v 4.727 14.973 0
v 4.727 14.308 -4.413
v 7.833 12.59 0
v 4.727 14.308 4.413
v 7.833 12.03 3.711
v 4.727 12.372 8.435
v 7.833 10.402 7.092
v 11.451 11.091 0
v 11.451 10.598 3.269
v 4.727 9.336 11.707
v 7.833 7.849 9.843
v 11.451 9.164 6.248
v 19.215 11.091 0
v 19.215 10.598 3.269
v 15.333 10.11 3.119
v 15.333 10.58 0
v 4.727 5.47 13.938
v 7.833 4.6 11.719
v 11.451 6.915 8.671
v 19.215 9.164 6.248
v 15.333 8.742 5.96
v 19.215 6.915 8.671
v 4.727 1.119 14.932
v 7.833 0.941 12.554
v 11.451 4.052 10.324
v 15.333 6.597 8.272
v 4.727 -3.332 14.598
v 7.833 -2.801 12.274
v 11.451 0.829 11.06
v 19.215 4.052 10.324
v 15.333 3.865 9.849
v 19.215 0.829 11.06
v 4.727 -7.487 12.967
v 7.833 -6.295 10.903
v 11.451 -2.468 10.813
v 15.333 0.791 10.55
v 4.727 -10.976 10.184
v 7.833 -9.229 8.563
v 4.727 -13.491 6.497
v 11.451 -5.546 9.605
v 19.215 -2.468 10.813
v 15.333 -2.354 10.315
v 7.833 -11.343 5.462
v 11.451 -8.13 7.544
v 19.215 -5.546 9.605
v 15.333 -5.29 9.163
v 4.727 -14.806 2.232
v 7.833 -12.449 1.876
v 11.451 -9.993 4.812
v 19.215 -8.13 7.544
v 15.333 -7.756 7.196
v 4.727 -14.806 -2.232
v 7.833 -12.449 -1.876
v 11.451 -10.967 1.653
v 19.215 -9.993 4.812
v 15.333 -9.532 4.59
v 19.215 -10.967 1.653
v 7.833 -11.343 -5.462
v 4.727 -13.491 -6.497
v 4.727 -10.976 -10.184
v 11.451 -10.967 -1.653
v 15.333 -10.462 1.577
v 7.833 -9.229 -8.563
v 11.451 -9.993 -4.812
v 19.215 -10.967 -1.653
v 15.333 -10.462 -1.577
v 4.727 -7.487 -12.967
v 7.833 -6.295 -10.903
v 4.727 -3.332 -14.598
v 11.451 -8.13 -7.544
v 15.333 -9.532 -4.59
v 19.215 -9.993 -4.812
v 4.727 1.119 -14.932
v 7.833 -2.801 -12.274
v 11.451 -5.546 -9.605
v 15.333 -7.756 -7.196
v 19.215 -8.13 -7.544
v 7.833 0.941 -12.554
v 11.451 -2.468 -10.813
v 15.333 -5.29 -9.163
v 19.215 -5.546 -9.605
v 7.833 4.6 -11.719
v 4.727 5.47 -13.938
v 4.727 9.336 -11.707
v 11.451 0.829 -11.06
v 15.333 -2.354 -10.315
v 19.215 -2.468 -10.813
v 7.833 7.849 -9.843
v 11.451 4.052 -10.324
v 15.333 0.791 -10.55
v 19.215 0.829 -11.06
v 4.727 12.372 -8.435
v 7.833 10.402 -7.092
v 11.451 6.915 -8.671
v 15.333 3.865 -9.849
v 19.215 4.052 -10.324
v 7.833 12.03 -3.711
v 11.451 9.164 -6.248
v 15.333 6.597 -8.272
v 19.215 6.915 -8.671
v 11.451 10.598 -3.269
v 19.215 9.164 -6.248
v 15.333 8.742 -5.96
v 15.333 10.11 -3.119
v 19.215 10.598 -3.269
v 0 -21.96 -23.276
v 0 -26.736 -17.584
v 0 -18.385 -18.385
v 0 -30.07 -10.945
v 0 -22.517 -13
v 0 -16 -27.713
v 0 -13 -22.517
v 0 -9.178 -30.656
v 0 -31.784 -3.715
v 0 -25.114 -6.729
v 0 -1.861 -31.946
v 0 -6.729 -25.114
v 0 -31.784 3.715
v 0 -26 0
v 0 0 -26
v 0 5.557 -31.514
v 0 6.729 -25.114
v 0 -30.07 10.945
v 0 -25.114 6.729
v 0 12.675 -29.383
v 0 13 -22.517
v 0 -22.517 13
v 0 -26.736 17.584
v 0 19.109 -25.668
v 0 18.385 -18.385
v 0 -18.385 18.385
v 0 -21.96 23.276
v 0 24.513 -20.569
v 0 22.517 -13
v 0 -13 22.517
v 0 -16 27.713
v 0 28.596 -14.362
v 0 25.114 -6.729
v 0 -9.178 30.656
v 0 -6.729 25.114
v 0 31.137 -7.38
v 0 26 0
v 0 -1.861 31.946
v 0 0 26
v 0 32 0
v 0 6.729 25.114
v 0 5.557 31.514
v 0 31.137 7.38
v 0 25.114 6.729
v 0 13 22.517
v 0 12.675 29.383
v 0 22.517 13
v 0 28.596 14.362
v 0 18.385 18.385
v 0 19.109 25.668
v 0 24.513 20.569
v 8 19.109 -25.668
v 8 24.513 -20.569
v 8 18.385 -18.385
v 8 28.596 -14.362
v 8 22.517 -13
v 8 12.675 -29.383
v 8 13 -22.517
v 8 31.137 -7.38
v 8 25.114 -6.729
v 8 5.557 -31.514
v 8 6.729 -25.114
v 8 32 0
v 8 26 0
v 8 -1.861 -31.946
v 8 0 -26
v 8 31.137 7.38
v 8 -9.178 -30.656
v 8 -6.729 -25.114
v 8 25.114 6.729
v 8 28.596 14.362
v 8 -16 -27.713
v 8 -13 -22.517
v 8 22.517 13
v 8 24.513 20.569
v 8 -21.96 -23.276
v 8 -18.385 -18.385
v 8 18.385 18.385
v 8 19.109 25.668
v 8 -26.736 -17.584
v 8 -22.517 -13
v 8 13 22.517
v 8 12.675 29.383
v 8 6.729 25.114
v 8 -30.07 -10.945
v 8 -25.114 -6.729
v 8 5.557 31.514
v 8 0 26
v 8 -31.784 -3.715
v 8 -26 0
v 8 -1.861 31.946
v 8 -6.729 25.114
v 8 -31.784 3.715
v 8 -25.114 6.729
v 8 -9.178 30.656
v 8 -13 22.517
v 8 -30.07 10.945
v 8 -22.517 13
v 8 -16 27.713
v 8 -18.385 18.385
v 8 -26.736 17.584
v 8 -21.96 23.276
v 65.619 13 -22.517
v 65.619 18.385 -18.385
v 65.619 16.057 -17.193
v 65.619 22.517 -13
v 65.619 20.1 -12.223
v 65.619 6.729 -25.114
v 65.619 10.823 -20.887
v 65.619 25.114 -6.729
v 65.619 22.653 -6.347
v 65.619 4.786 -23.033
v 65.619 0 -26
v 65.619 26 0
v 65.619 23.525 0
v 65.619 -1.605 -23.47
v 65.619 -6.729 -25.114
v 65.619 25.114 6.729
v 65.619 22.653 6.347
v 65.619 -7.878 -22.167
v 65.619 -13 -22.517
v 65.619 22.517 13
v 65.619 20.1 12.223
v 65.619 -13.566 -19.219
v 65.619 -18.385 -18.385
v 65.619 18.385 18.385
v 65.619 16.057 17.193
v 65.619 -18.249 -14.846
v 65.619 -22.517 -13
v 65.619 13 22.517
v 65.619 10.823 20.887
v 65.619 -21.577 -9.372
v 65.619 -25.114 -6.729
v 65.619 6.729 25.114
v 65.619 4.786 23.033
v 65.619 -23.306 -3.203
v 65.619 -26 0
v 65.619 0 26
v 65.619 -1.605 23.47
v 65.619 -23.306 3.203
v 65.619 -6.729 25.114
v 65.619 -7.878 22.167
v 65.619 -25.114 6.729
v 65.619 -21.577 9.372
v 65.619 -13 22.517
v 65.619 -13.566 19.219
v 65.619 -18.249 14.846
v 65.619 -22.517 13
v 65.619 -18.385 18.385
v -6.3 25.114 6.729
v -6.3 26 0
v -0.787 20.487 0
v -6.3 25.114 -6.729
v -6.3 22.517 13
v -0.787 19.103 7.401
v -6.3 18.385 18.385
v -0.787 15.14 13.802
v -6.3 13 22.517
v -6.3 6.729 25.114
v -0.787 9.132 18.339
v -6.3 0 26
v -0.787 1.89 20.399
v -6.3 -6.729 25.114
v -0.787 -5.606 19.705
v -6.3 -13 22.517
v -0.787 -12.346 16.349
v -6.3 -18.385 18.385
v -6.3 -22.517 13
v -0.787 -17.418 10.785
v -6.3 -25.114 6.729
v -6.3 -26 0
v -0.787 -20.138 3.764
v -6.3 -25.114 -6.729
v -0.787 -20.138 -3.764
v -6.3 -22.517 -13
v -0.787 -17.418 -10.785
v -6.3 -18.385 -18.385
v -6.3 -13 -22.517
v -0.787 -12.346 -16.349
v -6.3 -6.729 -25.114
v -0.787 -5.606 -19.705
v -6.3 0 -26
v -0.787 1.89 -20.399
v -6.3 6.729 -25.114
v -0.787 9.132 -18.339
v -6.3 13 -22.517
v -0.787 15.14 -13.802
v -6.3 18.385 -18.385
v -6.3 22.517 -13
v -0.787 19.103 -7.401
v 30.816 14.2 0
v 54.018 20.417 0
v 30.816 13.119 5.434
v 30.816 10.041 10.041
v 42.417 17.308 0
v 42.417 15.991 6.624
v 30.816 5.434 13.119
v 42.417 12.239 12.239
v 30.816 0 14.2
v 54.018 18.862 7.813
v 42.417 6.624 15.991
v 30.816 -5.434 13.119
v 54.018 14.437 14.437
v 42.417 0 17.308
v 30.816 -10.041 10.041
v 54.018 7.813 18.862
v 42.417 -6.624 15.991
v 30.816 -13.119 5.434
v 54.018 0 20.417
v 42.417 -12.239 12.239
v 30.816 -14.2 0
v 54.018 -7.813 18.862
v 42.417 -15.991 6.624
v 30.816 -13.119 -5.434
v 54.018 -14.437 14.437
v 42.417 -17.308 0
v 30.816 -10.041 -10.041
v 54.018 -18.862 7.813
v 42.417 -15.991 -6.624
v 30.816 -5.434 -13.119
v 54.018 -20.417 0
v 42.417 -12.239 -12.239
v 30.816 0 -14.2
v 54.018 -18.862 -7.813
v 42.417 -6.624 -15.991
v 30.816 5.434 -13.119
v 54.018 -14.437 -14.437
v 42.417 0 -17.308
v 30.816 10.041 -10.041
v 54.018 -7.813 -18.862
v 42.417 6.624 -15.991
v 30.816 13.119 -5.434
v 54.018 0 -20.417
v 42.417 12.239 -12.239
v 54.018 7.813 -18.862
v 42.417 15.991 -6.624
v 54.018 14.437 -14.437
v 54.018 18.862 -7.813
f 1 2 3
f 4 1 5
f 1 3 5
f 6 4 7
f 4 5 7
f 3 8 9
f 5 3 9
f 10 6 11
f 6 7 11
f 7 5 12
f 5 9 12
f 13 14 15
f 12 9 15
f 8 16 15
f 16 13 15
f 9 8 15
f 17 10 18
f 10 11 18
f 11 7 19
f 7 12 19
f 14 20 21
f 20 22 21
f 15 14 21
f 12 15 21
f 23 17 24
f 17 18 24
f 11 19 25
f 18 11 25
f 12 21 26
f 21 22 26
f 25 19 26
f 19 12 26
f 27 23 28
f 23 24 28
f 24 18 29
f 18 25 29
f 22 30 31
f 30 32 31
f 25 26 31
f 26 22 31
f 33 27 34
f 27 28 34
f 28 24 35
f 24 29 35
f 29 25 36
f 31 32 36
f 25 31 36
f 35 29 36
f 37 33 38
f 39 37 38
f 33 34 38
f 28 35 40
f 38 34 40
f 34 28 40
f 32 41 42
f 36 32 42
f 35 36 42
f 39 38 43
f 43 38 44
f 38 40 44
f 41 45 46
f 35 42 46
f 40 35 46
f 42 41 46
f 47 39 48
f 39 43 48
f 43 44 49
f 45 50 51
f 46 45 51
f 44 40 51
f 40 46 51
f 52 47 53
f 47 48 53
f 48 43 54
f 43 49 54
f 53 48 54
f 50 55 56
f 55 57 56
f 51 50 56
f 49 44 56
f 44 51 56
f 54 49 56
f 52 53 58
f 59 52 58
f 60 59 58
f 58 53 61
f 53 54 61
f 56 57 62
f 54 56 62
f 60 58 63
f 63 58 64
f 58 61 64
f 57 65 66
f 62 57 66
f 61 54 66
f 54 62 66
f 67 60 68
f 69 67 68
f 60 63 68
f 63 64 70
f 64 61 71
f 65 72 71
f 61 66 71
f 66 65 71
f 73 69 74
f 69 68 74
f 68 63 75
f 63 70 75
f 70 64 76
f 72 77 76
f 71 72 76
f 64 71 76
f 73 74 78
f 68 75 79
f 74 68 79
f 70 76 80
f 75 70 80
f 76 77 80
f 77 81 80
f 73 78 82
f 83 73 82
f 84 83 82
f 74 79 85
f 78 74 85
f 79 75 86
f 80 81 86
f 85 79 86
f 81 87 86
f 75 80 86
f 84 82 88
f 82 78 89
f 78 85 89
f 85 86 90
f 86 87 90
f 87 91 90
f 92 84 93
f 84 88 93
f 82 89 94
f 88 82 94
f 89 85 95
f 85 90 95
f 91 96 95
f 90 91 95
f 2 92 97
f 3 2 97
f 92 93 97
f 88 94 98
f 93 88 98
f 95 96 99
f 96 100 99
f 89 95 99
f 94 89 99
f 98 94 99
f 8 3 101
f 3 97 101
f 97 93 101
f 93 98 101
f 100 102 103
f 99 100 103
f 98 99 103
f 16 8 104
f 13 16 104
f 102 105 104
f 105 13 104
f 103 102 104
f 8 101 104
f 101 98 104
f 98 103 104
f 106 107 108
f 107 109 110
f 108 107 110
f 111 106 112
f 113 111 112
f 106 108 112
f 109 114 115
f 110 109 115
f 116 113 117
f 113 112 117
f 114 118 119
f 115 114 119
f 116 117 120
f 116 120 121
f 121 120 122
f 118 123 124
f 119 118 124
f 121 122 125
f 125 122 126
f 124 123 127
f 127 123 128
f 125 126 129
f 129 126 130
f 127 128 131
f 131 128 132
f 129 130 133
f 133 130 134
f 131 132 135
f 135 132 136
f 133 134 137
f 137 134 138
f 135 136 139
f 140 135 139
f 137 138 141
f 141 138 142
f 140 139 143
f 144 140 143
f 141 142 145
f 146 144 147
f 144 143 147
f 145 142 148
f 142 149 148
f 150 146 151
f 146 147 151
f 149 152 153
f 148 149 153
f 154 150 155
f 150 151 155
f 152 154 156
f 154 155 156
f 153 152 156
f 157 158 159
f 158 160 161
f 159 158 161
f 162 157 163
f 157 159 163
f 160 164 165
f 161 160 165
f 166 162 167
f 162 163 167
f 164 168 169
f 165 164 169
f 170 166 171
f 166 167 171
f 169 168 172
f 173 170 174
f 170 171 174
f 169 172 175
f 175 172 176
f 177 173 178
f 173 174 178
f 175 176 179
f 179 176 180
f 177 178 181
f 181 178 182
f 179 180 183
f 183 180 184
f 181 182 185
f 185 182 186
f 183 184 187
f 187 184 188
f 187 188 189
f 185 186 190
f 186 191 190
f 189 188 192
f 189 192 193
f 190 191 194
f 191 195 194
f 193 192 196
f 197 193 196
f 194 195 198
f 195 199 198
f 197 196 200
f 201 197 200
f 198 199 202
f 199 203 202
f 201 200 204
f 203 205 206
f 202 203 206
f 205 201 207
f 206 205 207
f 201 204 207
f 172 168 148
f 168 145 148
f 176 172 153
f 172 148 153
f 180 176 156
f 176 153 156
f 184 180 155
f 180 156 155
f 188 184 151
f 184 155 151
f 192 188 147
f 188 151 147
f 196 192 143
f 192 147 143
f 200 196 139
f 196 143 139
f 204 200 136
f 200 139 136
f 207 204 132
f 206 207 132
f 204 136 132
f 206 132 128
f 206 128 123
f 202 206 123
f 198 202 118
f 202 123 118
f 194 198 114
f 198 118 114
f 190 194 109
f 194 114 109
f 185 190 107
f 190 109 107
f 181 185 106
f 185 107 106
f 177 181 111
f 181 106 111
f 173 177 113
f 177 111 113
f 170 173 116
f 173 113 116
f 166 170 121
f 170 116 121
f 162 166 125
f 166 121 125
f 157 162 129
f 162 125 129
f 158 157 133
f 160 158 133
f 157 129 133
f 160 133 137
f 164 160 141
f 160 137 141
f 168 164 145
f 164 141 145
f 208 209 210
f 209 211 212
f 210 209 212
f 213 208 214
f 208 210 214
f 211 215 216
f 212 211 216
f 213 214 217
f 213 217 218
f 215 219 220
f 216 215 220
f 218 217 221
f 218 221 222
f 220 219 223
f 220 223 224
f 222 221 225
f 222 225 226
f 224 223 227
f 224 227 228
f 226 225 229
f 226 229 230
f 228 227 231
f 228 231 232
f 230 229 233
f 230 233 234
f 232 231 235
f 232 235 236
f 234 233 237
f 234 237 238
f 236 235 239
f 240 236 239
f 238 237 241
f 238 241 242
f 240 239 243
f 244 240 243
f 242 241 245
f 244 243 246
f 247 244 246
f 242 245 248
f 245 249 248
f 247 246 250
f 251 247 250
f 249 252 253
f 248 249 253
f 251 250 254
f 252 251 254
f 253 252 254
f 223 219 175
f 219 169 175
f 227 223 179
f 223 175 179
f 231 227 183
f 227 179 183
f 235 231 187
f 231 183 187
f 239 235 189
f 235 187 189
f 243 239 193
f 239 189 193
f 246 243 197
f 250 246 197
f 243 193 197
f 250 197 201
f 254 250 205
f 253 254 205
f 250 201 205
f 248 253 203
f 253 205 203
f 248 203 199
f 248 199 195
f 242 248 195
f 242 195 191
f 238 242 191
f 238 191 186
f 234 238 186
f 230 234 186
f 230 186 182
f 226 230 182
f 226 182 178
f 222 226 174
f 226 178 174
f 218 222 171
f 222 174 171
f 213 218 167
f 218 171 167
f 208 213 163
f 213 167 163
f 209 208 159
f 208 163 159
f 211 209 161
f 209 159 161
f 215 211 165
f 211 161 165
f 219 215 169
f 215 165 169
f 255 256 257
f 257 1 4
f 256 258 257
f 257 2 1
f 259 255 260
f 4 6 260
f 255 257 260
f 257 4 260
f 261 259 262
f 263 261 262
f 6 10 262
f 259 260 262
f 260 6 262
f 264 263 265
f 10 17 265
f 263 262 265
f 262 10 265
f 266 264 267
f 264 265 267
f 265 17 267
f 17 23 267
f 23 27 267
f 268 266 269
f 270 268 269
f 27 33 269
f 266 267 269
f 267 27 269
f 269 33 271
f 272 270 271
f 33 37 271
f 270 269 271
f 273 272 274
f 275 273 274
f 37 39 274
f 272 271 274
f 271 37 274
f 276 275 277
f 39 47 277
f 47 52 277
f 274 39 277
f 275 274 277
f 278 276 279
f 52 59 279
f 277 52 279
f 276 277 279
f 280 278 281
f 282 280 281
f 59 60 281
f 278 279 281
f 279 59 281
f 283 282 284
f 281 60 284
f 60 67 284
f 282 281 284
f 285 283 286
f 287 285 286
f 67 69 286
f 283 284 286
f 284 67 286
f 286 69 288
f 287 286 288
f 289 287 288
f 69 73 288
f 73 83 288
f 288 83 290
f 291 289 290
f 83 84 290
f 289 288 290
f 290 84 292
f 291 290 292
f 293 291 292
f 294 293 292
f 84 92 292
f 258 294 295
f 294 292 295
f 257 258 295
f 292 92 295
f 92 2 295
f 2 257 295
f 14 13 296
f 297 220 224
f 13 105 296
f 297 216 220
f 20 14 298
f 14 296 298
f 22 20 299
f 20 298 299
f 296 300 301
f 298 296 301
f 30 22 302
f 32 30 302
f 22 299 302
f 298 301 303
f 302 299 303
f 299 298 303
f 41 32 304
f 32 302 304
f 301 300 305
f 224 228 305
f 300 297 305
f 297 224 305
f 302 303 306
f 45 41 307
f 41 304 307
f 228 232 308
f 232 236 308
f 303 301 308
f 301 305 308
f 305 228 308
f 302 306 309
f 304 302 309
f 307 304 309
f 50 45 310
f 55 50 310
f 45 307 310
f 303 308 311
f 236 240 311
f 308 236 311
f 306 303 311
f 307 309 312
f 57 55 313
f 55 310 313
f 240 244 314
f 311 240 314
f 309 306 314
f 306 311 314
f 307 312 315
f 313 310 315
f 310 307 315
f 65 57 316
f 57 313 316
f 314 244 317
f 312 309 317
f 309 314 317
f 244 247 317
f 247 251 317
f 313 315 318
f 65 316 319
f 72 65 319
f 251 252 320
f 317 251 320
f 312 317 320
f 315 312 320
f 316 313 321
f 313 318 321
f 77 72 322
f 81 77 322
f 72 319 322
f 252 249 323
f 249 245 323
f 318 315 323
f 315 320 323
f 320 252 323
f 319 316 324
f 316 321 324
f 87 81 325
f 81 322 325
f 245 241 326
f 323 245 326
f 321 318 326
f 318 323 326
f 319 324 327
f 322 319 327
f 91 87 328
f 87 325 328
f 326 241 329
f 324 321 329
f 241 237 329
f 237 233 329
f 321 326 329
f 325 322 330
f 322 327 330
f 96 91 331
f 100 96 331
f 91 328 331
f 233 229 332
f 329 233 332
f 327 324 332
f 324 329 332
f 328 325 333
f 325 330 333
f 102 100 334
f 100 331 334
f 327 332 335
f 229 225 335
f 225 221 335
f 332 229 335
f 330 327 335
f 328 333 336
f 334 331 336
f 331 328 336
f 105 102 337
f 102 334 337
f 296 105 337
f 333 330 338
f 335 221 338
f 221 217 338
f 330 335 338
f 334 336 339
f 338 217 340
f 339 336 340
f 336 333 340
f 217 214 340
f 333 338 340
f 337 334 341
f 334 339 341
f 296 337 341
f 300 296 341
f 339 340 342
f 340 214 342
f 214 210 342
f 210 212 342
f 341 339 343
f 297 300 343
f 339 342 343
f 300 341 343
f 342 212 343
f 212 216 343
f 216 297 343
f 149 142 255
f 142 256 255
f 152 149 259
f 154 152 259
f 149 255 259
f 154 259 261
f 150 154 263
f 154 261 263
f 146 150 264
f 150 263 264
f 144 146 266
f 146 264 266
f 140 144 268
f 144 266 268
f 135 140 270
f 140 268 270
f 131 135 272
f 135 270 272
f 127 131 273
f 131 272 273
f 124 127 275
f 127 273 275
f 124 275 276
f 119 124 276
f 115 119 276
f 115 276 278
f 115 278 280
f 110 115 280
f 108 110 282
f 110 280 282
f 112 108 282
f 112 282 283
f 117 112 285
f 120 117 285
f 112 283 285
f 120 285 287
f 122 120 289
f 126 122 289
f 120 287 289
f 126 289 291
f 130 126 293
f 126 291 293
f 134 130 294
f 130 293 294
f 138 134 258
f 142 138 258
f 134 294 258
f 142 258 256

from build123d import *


with BuildPart() as part:
    # Sketch1 → Revolve1 (revolve)
    with BuildSketch(Plane.XY):
        with BuildLine():
            Line((-6.3, 26), (4.726601718, 14.973398282))
            ThreePointArc((4.726601718, 14.973398282), (11.450917759, 11.091112606), (19.215489112, 11.091112606))
            Line((19.215489112, 11.091112606), (65.619388603, 23.525))
            Line((65.619388603, 23.525), (65.619388603, 26))
            Line((65.619388603, 26), (8, 26))
            Line((8, 26), (8, 32))
            Line((8, 32), (0, 32))
            Line((0, 32), (0, 26))
            Line((0, 26), (-6.3, 26))
        make_face()
    revolve(axis=Axis((0, 0, 0), (1, 0, 0)))


solid = part.part
